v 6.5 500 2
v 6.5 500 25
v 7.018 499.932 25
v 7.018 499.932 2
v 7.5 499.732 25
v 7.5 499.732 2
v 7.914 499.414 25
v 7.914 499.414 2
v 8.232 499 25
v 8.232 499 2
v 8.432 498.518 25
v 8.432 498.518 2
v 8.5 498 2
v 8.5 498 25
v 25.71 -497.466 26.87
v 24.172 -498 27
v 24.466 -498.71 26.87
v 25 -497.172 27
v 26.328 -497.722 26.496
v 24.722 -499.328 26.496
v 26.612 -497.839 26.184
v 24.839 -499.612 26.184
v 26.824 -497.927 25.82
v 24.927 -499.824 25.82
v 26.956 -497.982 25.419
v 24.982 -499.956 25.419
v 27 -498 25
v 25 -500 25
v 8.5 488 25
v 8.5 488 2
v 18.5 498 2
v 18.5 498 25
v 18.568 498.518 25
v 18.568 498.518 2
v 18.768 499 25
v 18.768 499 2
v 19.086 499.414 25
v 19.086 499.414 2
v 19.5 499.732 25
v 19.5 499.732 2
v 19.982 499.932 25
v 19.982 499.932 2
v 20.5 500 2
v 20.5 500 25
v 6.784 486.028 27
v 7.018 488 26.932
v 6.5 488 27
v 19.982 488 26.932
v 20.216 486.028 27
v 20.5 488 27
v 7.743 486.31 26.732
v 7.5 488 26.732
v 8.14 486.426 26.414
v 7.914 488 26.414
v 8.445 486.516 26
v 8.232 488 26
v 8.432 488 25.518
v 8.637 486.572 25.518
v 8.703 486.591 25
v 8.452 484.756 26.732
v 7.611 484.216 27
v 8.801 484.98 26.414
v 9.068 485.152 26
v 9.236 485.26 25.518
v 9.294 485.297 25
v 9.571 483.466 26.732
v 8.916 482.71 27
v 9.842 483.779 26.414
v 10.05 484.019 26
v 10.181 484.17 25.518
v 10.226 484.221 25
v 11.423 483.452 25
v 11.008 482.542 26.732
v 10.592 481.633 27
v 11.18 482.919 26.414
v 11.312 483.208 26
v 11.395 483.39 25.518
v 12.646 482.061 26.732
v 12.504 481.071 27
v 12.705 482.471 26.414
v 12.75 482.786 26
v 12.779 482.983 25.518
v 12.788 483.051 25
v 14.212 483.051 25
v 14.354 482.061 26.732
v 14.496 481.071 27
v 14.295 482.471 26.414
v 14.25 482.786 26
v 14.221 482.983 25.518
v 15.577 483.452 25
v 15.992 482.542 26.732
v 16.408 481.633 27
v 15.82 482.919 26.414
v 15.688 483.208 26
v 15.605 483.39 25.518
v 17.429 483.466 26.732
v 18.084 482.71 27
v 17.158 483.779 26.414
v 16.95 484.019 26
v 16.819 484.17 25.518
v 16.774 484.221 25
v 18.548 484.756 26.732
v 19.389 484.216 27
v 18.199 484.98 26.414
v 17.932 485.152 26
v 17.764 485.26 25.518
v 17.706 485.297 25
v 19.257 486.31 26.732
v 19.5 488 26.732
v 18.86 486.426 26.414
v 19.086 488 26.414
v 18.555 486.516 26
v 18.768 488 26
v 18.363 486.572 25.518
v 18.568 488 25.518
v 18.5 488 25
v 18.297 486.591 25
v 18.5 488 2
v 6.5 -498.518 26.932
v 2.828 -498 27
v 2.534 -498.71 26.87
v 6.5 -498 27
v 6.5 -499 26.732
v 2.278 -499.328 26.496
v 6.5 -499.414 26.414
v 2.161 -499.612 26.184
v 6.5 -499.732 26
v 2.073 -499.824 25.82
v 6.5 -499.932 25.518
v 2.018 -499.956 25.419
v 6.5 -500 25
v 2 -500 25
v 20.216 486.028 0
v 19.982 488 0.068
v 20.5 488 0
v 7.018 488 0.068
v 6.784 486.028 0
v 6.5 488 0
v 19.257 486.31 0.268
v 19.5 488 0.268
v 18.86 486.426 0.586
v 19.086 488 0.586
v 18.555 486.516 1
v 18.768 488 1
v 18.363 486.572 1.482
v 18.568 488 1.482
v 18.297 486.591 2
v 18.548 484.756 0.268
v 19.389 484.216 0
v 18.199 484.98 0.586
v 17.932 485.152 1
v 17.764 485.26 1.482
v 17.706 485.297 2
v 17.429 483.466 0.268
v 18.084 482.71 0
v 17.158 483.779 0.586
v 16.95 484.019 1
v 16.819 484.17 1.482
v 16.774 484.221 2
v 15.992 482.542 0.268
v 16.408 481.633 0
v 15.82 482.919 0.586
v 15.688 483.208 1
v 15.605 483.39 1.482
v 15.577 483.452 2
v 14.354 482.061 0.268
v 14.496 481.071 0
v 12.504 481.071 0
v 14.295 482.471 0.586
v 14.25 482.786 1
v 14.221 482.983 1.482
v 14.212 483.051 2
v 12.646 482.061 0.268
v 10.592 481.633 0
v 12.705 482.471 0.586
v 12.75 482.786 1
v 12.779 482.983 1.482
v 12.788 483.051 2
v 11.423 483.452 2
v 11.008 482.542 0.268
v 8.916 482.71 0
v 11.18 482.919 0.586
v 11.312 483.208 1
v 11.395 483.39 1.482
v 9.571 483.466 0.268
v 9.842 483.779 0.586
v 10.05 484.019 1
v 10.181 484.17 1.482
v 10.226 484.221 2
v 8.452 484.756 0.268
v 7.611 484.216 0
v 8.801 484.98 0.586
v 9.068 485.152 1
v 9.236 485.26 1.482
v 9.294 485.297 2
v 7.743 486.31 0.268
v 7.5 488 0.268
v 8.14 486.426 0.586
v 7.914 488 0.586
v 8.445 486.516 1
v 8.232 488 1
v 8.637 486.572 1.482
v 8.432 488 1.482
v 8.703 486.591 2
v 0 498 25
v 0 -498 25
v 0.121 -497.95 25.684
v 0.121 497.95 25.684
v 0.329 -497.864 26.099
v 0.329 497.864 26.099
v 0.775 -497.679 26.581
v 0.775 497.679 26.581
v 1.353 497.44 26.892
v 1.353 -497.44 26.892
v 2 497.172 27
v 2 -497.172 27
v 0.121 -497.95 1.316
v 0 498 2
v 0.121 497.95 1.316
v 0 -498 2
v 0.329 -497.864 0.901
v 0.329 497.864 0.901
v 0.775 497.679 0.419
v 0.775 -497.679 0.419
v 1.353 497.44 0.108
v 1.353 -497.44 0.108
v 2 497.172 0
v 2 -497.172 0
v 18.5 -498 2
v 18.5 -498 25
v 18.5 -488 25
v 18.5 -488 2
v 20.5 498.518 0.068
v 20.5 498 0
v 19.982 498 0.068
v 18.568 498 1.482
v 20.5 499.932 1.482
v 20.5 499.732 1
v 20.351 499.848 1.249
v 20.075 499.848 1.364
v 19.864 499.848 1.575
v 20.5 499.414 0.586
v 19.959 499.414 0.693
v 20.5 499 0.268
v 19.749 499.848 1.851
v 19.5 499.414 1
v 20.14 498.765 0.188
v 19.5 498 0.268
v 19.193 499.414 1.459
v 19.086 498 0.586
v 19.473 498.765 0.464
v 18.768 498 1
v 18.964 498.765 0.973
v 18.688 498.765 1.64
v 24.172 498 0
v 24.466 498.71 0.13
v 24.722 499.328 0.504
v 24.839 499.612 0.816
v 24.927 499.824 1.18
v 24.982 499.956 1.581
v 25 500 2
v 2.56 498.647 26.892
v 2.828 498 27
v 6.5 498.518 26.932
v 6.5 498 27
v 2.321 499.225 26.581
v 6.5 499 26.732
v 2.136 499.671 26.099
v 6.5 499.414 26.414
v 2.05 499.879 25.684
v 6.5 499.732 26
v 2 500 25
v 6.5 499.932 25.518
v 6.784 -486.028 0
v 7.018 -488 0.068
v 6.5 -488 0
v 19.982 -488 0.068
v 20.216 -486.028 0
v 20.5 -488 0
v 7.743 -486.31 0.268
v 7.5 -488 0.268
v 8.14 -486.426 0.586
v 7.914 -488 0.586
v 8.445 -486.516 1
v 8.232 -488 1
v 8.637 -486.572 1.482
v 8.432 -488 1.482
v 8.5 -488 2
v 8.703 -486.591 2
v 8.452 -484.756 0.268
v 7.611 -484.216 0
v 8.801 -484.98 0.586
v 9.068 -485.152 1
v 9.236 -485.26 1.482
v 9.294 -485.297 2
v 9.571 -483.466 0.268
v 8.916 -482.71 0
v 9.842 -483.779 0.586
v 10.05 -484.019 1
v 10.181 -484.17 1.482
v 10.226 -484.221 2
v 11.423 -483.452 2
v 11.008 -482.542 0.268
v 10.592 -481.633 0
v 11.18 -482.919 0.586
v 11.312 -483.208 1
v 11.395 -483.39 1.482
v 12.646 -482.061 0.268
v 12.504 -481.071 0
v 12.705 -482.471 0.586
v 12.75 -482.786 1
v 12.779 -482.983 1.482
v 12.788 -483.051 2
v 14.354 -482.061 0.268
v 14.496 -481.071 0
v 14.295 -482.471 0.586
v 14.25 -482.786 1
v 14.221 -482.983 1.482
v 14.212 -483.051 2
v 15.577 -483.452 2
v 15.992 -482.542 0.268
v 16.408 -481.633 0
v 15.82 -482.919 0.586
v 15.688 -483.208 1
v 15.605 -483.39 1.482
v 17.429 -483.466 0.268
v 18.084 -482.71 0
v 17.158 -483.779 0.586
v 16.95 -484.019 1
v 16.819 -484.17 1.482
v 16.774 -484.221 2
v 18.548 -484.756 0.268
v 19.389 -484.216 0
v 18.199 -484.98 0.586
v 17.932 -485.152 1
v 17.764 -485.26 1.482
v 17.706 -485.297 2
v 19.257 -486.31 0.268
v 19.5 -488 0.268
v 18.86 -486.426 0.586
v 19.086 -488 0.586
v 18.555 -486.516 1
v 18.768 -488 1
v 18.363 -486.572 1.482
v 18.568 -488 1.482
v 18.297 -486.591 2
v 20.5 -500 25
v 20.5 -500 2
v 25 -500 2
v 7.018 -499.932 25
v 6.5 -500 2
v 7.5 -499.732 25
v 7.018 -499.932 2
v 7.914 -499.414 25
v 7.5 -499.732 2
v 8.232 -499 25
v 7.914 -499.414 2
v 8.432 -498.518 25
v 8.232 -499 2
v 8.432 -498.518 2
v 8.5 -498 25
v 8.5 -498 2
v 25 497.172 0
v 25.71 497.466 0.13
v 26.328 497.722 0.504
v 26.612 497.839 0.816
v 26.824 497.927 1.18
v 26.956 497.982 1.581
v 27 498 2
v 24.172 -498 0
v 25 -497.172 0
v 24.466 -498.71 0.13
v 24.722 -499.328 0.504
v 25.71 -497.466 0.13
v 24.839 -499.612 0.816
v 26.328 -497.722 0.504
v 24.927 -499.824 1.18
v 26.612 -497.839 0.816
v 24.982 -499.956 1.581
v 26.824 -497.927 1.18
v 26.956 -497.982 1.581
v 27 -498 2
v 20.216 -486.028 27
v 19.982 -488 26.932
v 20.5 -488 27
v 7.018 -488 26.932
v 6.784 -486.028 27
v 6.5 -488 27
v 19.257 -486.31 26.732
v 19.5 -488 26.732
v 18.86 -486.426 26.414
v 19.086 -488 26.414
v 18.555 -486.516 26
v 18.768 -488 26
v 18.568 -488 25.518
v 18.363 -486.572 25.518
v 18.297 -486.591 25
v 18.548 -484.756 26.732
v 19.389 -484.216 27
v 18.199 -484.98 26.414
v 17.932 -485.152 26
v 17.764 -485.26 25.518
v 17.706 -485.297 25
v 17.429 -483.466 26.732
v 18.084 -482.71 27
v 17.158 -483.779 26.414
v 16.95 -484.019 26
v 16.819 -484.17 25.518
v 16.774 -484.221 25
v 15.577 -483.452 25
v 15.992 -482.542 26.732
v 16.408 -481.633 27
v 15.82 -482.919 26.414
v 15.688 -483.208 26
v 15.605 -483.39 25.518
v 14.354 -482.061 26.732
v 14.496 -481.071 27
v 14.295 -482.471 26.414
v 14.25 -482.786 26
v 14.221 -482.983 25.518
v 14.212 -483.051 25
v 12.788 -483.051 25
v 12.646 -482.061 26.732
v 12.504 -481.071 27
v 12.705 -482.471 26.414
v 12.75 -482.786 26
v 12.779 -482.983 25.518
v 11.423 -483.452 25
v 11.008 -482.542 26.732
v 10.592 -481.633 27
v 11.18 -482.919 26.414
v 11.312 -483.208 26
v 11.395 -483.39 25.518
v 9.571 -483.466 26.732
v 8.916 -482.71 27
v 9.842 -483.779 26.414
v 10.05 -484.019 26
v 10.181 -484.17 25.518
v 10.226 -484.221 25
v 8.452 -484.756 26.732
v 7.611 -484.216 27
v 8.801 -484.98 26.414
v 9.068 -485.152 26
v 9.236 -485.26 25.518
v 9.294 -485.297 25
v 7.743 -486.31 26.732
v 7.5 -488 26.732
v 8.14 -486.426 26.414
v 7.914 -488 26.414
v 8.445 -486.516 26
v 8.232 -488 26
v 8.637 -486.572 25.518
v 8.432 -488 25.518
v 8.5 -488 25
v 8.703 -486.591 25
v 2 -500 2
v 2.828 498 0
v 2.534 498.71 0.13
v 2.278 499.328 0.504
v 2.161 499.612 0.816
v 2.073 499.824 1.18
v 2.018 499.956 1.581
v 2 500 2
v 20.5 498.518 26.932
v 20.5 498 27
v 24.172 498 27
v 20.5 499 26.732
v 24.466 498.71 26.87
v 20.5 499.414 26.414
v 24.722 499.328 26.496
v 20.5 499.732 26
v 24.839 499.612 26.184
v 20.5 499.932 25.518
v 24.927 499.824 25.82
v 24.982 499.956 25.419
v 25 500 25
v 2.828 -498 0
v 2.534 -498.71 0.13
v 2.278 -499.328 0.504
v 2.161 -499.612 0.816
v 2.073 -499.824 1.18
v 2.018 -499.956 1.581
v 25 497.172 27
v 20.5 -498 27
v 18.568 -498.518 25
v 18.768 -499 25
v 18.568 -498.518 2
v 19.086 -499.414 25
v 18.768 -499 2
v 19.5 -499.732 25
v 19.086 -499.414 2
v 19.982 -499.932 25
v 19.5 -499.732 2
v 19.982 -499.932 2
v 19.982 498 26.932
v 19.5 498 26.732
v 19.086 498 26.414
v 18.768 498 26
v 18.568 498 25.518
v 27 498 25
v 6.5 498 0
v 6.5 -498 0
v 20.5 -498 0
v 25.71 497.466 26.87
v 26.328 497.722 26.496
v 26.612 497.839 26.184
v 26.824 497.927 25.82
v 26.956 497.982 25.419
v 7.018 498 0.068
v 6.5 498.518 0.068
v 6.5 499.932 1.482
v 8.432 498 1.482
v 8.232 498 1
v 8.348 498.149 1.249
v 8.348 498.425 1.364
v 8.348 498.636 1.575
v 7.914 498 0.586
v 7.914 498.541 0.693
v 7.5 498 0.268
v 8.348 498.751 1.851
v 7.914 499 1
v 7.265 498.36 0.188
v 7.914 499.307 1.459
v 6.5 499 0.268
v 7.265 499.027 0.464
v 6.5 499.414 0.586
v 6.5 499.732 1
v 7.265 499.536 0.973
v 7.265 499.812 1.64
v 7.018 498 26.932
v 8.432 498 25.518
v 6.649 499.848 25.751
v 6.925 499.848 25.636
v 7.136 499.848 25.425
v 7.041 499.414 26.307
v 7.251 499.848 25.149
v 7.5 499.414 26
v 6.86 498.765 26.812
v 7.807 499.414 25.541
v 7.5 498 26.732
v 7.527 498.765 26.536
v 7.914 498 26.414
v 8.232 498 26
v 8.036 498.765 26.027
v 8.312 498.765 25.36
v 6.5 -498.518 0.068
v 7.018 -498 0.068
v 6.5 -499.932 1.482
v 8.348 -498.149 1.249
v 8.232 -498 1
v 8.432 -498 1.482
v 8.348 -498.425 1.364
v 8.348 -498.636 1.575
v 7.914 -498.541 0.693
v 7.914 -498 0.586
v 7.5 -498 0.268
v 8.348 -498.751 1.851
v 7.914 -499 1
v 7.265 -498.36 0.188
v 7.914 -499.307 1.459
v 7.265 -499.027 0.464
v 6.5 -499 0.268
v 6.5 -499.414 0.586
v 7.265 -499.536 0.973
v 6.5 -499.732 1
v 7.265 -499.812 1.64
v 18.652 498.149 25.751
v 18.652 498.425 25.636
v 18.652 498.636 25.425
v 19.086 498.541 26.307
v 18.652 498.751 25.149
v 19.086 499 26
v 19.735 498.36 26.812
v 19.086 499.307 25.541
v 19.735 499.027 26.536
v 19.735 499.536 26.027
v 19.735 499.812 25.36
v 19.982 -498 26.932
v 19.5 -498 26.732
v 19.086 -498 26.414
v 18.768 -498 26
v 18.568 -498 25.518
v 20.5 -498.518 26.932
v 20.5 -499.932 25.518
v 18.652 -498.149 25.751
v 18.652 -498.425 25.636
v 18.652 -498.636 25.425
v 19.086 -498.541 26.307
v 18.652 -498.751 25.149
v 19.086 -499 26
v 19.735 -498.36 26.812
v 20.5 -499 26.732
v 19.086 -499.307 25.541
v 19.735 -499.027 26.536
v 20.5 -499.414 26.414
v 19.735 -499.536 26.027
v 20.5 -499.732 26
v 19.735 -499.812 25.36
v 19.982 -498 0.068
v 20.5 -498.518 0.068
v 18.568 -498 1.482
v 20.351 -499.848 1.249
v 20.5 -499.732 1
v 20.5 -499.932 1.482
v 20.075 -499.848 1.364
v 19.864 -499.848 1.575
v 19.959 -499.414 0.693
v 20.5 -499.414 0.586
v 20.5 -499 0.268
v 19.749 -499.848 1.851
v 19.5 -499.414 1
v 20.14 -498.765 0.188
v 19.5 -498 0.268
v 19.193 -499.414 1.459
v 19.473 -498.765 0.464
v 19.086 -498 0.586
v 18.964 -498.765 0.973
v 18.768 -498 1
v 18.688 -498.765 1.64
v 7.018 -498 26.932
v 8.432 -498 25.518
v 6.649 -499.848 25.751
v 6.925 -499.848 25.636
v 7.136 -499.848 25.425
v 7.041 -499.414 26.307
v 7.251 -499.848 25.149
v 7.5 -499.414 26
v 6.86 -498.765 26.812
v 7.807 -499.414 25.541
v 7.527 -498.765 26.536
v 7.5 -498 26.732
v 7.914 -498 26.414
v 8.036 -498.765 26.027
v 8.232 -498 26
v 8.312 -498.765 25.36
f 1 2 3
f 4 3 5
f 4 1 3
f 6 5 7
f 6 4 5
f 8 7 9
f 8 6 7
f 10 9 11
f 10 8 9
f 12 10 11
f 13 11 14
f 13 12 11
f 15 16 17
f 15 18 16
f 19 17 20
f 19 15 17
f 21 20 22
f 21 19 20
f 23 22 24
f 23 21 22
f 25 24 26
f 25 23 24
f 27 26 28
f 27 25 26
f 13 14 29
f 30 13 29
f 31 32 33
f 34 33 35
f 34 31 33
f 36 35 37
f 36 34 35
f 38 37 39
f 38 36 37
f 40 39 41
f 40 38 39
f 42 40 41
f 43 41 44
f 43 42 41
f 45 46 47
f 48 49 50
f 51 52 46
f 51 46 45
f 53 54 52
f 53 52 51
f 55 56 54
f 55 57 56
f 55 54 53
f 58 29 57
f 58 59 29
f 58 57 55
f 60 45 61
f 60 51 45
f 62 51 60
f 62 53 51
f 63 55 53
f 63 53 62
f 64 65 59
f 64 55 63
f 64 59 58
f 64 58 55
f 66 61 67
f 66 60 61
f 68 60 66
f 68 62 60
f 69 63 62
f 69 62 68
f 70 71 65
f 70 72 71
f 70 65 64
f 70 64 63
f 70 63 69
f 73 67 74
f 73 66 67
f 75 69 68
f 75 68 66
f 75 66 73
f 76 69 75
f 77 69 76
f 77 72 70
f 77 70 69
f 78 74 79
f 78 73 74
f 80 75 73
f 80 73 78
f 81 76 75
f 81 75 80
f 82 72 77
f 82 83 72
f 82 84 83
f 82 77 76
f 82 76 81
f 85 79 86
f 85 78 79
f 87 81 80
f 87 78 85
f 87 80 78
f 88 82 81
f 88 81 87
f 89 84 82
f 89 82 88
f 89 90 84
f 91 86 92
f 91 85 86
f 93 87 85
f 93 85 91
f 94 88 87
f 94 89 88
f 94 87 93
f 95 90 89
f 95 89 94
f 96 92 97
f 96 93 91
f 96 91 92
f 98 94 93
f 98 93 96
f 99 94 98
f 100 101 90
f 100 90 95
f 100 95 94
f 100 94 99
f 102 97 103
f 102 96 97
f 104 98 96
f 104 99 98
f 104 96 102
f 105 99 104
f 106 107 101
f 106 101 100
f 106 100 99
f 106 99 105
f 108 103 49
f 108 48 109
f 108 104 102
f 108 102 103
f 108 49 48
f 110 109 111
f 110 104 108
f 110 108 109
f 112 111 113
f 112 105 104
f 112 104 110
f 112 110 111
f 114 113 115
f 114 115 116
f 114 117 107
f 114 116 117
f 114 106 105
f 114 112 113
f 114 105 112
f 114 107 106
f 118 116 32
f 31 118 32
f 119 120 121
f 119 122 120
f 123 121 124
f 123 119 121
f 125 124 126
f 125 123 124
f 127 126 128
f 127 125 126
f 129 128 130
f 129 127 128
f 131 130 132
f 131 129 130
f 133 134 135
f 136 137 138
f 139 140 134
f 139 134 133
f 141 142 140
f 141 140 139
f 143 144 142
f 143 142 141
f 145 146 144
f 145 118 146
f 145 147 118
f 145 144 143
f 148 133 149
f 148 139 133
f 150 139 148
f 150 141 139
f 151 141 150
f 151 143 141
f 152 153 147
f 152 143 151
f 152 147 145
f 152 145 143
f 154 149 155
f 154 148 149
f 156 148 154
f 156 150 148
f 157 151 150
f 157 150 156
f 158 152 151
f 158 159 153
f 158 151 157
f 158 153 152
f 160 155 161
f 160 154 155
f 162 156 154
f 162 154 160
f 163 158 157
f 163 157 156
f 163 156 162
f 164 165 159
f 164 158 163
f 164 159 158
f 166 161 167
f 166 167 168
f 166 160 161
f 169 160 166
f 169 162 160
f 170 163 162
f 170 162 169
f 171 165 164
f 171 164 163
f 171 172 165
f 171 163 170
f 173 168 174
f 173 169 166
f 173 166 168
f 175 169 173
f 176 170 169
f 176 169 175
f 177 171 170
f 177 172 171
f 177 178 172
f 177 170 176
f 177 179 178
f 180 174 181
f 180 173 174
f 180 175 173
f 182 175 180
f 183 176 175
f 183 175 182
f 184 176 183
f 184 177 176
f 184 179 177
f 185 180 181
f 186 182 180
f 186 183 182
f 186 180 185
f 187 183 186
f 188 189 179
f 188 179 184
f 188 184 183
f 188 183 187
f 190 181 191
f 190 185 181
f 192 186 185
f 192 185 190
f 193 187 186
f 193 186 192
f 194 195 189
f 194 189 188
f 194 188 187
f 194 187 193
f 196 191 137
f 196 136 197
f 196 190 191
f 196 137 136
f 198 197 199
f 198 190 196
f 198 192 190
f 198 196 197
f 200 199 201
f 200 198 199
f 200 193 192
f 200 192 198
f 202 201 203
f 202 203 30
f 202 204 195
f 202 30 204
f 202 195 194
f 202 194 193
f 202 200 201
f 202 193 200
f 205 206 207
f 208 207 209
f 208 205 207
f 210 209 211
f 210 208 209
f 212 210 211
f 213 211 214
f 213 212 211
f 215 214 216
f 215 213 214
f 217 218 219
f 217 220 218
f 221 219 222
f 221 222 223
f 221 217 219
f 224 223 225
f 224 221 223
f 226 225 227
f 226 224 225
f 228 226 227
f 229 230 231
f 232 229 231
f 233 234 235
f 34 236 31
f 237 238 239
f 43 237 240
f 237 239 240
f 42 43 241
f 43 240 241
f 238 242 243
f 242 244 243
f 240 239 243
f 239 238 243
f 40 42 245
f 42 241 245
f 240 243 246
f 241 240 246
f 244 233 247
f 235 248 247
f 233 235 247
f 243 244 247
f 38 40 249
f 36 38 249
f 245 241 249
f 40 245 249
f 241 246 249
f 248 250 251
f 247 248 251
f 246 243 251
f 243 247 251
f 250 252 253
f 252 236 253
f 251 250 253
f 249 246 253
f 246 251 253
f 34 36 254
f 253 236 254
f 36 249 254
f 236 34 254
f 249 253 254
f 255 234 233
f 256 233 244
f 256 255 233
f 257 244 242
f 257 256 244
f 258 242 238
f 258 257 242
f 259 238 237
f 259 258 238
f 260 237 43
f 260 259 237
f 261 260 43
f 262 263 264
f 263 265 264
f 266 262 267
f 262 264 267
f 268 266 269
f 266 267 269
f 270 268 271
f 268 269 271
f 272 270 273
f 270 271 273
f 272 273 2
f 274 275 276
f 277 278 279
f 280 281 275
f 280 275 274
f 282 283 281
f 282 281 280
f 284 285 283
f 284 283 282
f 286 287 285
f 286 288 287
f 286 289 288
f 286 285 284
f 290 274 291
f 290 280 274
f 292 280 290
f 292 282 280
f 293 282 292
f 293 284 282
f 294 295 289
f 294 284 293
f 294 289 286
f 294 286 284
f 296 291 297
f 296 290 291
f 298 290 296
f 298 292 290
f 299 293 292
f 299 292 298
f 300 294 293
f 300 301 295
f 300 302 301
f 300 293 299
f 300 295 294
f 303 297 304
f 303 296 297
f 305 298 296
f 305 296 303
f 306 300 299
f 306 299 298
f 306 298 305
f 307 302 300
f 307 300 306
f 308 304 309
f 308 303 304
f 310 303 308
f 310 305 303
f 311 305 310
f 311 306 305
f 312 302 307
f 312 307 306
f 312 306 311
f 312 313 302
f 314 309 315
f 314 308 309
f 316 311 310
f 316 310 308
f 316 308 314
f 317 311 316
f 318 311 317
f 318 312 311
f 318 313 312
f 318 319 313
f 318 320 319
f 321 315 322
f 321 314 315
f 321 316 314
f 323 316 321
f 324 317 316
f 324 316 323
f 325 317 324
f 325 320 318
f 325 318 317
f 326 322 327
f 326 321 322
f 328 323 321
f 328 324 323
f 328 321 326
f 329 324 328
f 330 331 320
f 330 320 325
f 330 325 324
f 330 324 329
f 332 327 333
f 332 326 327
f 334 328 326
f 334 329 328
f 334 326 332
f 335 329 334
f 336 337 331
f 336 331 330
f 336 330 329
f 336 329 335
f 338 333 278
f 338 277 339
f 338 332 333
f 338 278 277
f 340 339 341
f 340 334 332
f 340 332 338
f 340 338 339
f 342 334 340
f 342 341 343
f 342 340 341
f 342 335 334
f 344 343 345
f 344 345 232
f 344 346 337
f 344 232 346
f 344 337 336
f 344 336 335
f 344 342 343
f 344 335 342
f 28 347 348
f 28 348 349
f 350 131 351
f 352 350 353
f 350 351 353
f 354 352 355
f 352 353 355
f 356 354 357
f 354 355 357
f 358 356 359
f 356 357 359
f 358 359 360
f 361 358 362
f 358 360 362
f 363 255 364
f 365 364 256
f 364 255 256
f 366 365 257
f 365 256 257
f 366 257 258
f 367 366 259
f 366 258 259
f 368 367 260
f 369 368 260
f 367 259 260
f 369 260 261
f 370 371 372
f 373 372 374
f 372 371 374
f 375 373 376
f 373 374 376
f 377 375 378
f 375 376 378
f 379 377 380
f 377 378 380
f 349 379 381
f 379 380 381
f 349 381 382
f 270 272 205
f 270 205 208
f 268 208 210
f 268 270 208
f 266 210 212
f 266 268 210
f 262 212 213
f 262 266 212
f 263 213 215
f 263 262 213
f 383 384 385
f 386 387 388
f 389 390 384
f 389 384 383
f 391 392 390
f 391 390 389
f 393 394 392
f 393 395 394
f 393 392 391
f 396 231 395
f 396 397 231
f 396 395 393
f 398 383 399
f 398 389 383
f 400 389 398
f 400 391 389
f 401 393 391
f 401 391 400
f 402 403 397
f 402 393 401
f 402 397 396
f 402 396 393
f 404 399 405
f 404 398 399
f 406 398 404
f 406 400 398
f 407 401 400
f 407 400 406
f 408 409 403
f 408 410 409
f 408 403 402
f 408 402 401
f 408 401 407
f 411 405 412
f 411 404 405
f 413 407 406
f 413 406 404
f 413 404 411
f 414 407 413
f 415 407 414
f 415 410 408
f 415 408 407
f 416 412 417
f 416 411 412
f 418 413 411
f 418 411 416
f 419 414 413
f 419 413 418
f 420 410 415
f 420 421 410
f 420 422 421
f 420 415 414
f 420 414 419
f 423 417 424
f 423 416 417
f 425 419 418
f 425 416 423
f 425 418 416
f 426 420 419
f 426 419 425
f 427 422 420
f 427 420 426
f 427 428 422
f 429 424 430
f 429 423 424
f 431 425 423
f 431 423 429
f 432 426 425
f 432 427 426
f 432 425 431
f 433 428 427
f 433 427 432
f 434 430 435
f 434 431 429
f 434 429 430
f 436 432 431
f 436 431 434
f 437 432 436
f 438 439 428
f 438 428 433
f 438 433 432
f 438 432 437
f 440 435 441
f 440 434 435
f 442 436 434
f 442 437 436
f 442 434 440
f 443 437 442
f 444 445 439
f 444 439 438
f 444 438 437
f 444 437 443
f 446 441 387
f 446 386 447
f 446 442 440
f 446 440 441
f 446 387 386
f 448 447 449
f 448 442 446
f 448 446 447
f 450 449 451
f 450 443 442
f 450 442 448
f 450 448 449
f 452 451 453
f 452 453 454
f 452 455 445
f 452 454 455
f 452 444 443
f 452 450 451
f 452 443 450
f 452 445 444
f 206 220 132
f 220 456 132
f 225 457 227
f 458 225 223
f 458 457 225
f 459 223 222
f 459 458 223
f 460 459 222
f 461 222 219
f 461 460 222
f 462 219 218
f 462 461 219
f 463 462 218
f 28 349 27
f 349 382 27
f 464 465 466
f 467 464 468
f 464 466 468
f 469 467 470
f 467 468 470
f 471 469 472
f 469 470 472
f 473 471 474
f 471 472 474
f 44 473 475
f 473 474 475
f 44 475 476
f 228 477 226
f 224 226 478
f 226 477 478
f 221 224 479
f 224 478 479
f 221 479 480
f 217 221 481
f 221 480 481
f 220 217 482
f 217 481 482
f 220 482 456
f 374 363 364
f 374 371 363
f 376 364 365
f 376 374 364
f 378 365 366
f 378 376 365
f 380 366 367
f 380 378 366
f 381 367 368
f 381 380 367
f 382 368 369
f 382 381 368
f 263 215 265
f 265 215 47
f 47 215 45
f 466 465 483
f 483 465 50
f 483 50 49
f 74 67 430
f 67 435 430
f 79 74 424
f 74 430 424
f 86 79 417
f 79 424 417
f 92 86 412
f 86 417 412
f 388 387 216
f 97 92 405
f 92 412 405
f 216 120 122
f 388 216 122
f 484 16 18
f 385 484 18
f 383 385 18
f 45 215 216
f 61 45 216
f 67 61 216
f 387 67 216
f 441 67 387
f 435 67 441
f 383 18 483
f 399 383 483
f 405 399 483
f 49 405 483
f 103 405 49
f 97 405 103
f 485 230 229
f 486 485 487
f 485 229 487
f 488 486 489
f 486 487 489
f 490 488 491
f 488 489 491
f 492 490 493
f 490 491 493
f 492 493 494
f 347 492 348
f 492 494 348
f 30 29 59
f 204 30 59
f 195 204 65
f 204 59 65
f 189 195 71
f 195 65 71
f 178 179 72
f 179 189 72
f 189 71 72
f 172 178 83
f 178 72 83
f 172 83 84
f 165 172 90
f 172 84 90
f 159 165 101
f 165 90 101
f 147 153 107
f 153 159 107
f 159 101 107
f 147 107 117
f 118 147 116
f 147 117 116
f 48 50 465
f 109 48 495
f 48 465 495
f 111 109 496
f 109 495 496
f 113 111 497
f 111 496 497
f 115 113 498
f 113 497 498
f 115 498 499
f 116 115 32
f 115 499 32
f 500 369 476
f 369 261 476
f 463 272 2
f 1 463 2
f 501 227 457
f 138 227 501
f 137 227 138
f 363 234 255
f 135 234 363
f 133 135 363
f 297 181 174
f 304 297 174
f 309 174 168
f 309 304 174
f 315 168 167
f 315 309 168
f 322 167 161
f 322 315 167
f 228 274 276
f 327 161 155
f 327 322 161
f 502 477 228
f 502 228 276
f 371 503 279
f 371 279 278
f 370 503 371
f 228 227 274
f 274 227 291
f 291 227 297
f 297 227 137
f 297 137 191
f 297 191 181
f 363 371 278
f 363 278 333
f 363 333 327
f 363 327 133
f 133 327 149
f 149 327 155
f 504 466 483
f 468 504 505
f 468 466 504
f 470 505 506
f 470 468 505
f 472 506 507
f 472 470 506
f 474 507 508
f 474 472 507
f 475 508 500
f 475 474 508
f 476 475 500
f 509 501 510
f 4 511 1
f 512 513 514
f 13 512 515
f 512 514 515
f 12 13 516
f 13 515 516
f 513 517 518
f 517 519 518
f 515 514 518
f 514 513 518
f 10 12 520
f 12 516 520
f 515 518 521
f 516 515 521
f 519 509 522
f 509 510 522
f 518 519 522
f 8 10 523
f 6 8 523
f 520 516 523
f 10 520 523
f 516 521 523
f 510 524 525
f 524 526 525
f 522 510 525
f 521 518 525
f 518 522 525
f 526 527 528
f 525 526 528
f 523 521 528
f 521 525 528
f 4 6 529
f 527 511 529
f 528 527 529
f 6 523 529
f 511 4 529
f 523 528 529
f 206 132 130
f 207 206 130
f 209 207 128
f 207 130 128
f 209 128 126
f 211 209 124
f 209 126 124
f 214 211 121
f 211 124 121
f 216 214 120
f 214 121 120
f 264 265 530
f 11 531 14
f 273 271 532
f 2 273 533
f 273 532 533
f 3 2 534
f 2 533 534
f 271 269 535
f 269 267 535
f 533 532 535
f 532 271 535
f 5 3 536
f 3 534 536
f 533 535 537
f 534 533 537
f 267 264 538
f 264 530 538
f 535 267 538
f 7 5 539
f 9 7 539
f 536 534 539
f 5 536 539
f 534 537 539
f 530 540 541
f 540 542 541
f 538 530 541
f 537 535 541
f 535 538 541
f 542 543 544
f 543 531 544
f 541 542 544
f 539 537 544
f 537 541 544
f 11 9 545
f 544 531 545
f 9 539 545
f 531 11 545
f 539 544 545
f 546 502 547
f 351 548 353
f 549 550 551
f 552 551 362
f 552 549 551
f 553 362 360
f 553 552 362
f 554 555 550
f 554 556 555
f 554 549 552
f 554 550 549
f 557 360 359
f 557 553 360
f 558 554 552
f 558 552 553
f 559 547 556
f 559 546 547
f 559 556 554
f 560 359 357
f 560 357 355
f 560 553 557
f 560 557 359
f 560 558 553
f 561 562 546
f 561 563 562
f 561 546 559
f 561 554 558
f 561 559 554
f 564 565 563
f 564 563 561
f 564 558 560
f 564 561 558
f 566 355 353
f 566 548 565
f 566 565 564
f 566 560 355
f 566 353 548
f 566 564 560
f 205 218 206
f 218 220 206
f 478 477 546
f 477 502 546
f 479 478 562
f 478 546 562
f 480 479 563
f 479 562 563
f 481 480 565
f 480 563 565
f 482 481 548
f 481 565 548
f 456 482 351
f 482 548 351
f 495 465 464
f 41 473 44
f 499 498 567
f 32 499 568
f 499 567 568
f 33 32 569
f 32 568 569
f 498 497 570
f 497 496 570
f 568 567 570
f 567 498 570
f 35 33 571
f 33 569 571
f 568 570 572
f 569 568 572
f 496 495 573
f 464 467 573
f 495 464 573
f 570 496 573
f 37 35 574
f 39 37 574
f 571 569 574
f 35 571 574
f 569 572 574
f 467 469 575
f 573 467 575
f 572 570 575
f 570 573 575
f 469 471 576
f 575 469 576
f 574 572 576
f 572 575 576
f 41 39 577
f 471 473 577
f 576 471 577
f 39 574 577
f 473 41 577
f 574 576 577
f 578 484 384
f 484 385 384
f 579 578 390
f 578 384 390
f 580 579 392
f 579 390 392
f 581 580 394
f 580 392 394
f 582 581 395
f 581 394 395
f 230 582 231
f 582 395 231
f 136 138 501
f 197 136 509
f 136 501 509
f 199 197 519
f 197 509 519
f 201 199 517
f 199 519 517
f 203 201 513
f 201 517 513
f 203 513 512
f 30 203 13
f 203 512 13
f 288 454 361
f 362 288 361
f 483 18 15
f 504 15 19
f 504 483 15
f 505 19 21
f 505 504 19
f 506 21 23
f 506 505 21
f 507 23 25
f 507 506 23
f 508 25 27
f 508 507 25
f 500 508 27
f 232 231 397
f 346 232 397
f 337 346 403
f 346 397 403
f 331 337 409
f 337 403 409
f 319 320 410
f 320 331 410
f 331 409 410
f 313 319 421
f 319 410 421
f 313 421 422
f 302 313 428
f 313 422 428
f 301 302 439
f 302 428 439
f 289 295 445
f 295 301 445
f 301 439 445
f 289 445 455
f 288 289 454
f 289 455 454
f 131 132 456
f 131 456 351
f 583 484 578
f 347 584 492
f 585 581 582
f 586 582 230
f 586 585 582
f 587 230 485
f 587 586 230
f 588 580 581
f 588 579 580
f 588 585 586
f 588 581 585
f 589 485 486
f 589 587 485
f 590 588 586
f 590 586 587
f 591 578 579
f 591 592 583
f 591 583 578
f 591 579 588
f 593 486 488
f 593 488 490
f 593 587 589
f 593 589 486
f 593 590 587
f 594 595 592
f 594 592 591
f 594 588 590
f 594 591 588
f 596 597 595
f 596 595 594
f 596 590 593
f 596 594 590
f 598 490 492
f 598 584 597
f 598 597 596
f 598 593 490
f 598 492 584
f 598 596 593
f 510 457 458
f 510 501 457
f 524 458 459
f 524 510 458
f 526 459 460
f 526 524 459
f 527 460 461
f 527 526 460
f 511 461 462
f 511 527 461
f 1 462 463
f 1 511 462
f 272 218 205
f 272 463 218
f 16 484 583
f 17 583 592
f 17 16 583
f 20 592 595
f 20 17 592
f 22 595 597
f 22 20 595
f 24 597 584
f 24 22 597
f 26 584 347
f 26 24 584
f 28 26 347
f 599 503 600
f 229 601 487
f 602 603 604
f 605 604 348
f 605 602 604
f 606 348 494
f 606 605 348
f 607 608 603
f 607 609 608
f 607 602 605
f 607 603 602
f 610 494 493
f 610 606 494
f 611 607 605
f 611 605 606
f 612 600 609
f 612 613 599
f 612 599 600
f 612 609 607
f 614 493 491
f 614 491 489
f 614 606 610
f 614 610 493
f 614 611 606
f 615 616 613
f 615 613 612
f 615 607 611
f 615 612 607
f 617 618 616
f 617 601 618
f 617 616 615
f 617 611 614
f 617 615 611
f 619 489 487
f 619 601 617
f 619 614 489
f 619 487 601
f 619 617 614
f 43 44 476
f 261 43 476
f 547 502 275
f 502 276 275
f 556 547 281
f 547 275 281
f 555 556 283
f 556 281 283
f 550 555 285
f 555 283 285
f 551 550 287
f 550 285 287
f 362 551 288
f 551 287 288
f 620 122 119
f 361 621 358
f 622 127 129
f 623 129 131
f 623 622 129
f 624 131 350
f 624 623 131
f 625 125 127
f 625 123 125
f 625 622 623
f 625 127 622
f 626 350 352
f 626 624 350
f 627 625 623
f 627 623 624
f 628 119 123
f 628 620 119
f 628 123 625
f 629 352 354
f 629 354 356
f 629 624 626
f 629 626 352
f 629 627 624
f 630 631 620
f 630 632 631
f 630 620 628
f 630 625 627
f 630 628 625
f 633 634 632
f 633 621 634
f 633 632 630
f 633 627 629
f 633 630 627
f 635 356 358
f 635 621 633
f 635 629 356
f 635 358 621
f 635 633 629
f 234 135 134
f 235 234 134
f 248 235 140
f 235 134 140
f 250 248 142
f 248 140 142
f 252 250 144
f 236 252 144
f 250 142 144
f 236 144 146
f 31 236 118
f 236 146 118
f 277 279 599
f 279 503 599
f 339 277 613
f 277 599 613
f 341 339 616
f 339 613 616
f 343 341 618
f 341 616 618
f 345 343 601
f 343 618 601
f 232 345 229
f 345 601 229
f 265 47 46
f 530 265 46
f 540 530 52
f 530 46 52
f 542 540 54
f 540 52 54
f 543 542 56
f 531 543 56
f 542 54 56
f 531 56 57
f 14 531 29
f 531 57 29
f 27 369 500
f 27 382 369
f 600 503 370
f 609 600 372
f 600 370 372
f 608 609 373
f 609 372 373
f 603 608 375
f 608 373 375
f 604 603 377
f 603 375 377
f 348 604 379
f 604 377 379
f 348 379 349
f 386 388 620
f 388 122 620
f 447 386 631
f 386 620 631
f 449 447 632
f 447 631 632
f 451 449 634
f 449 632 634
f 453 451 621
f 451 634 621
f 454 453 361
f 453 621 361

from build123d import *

# Parameters (mm, degrees)
F0_W     = 27
F0_H     = 27
F1_DEPTH = 500
F3_DEPTH = 27.001
F4_DEPTH = 27.001
F5_SIZE  = 2
F6_R     = 2


with BuildPart() as f1:
    # F0 (on Front) → F1 (new body, symmetric)
    with BuildSketch(Plane.XZ):
        with Locations((13.5, 13.5)):
            Rectangle(F0_W, F0_H)
    extrude(amount=F1_DEPTH, both=True)

    # F2 (on face) → F3 (cut, through all)
    with BuildSketch(Plane.XY.offset(27)):
        with BuildLine():
            Line((18.5, -500), (18.5, -488))
            ThreePointArc((18.5, -488), (13.5, -483), (8.5, -488))
            Line((8.5, -488), (8.5, -500))
            Line((8.5, -500), (18.5, -500))
        make_face()
    extrude(amount=-F3_DEPTH, mode=Mode.SUBTRACT)

    # F2 (on face) → F4 (cut, through all)
    with BuildSketch(Plane.XY.offset(27)):
        with BuildLine():
            Line((18.5, -500), (18.5, -488))
            ThreePointArc((18.5, -488), (13.5, -483), (8.5, -488))
            Line((8.5, -488), (8.5, -500))
            Line((8.5, -500), (18.5, -500))
        make_face()
        with BuildLine():
            ThreePointArc((8.5, 488), (13.5, 483), (18.5, 488))
            Line((18.5, 488), (18.5, 500))
            Line((18.5, 500), (8.5, 500))
            Line((8.5, 500), (8.5, 488))
        make_face()
    extrude(amount=-F4_DEPTH, mode=Mode.SUBTRACT)

    # F5
    f5_edges = [f1.edges().sort_by_distance(p)[0] for p in [
        (0, -500, 13.5),
        (27, -500, 13.5),
        (0, 500, 13.5),
        (27, 500, 13.5),
    ]]
    chamfer(f5_edges, length=F5_SIZE)

    # F6
    f6_edges = [f1.edges().sort_by_distance(p)[0] for p in [
        (21.75, -500, 27),
        (26, -499, 27),
        (18.5, -494, 27),
        (27, 0, 27),
        (13.5, -483, 27),
        (26, 499, 27),
        (8.5, -494, 27),
        (21.75, 500, 27),
        (5.25, -500, 27),
        (18.5, 494, 27),
        (1, -499, 27),
        (13.5, 483, 27),
        (0, 0, 27),
        (8.5, 494, 27),
        (1, 499, 27),
        (5.25, 500, 27),
        (0, 0, 0),
        (1, 499, 0),
        (1, -499, 0),
        (5.25, 500, 0),
        (5.25, -500, 0),
        (8.5, 494, 0),
        (8.5, -494, 0),
        (13.5, 483, 0),
        (13.5, -483, 0),
        (18.5, 494, 0),
        (18.5, -494, 0),
        (21.75, 500, 0),
        (21.75, -500, 0),
        (26, 499, 0),
        (26, -499, 0),
        (27, 0, 0),
        (18.5, 500, 13.5),
        (8.5, 500, 13.5),
        (18.5, -500, 13.5),
        (8.5, -500, 13.5),
    ]]
    fillet(f6_edges, radius=F6_R)


solid = f1.part
